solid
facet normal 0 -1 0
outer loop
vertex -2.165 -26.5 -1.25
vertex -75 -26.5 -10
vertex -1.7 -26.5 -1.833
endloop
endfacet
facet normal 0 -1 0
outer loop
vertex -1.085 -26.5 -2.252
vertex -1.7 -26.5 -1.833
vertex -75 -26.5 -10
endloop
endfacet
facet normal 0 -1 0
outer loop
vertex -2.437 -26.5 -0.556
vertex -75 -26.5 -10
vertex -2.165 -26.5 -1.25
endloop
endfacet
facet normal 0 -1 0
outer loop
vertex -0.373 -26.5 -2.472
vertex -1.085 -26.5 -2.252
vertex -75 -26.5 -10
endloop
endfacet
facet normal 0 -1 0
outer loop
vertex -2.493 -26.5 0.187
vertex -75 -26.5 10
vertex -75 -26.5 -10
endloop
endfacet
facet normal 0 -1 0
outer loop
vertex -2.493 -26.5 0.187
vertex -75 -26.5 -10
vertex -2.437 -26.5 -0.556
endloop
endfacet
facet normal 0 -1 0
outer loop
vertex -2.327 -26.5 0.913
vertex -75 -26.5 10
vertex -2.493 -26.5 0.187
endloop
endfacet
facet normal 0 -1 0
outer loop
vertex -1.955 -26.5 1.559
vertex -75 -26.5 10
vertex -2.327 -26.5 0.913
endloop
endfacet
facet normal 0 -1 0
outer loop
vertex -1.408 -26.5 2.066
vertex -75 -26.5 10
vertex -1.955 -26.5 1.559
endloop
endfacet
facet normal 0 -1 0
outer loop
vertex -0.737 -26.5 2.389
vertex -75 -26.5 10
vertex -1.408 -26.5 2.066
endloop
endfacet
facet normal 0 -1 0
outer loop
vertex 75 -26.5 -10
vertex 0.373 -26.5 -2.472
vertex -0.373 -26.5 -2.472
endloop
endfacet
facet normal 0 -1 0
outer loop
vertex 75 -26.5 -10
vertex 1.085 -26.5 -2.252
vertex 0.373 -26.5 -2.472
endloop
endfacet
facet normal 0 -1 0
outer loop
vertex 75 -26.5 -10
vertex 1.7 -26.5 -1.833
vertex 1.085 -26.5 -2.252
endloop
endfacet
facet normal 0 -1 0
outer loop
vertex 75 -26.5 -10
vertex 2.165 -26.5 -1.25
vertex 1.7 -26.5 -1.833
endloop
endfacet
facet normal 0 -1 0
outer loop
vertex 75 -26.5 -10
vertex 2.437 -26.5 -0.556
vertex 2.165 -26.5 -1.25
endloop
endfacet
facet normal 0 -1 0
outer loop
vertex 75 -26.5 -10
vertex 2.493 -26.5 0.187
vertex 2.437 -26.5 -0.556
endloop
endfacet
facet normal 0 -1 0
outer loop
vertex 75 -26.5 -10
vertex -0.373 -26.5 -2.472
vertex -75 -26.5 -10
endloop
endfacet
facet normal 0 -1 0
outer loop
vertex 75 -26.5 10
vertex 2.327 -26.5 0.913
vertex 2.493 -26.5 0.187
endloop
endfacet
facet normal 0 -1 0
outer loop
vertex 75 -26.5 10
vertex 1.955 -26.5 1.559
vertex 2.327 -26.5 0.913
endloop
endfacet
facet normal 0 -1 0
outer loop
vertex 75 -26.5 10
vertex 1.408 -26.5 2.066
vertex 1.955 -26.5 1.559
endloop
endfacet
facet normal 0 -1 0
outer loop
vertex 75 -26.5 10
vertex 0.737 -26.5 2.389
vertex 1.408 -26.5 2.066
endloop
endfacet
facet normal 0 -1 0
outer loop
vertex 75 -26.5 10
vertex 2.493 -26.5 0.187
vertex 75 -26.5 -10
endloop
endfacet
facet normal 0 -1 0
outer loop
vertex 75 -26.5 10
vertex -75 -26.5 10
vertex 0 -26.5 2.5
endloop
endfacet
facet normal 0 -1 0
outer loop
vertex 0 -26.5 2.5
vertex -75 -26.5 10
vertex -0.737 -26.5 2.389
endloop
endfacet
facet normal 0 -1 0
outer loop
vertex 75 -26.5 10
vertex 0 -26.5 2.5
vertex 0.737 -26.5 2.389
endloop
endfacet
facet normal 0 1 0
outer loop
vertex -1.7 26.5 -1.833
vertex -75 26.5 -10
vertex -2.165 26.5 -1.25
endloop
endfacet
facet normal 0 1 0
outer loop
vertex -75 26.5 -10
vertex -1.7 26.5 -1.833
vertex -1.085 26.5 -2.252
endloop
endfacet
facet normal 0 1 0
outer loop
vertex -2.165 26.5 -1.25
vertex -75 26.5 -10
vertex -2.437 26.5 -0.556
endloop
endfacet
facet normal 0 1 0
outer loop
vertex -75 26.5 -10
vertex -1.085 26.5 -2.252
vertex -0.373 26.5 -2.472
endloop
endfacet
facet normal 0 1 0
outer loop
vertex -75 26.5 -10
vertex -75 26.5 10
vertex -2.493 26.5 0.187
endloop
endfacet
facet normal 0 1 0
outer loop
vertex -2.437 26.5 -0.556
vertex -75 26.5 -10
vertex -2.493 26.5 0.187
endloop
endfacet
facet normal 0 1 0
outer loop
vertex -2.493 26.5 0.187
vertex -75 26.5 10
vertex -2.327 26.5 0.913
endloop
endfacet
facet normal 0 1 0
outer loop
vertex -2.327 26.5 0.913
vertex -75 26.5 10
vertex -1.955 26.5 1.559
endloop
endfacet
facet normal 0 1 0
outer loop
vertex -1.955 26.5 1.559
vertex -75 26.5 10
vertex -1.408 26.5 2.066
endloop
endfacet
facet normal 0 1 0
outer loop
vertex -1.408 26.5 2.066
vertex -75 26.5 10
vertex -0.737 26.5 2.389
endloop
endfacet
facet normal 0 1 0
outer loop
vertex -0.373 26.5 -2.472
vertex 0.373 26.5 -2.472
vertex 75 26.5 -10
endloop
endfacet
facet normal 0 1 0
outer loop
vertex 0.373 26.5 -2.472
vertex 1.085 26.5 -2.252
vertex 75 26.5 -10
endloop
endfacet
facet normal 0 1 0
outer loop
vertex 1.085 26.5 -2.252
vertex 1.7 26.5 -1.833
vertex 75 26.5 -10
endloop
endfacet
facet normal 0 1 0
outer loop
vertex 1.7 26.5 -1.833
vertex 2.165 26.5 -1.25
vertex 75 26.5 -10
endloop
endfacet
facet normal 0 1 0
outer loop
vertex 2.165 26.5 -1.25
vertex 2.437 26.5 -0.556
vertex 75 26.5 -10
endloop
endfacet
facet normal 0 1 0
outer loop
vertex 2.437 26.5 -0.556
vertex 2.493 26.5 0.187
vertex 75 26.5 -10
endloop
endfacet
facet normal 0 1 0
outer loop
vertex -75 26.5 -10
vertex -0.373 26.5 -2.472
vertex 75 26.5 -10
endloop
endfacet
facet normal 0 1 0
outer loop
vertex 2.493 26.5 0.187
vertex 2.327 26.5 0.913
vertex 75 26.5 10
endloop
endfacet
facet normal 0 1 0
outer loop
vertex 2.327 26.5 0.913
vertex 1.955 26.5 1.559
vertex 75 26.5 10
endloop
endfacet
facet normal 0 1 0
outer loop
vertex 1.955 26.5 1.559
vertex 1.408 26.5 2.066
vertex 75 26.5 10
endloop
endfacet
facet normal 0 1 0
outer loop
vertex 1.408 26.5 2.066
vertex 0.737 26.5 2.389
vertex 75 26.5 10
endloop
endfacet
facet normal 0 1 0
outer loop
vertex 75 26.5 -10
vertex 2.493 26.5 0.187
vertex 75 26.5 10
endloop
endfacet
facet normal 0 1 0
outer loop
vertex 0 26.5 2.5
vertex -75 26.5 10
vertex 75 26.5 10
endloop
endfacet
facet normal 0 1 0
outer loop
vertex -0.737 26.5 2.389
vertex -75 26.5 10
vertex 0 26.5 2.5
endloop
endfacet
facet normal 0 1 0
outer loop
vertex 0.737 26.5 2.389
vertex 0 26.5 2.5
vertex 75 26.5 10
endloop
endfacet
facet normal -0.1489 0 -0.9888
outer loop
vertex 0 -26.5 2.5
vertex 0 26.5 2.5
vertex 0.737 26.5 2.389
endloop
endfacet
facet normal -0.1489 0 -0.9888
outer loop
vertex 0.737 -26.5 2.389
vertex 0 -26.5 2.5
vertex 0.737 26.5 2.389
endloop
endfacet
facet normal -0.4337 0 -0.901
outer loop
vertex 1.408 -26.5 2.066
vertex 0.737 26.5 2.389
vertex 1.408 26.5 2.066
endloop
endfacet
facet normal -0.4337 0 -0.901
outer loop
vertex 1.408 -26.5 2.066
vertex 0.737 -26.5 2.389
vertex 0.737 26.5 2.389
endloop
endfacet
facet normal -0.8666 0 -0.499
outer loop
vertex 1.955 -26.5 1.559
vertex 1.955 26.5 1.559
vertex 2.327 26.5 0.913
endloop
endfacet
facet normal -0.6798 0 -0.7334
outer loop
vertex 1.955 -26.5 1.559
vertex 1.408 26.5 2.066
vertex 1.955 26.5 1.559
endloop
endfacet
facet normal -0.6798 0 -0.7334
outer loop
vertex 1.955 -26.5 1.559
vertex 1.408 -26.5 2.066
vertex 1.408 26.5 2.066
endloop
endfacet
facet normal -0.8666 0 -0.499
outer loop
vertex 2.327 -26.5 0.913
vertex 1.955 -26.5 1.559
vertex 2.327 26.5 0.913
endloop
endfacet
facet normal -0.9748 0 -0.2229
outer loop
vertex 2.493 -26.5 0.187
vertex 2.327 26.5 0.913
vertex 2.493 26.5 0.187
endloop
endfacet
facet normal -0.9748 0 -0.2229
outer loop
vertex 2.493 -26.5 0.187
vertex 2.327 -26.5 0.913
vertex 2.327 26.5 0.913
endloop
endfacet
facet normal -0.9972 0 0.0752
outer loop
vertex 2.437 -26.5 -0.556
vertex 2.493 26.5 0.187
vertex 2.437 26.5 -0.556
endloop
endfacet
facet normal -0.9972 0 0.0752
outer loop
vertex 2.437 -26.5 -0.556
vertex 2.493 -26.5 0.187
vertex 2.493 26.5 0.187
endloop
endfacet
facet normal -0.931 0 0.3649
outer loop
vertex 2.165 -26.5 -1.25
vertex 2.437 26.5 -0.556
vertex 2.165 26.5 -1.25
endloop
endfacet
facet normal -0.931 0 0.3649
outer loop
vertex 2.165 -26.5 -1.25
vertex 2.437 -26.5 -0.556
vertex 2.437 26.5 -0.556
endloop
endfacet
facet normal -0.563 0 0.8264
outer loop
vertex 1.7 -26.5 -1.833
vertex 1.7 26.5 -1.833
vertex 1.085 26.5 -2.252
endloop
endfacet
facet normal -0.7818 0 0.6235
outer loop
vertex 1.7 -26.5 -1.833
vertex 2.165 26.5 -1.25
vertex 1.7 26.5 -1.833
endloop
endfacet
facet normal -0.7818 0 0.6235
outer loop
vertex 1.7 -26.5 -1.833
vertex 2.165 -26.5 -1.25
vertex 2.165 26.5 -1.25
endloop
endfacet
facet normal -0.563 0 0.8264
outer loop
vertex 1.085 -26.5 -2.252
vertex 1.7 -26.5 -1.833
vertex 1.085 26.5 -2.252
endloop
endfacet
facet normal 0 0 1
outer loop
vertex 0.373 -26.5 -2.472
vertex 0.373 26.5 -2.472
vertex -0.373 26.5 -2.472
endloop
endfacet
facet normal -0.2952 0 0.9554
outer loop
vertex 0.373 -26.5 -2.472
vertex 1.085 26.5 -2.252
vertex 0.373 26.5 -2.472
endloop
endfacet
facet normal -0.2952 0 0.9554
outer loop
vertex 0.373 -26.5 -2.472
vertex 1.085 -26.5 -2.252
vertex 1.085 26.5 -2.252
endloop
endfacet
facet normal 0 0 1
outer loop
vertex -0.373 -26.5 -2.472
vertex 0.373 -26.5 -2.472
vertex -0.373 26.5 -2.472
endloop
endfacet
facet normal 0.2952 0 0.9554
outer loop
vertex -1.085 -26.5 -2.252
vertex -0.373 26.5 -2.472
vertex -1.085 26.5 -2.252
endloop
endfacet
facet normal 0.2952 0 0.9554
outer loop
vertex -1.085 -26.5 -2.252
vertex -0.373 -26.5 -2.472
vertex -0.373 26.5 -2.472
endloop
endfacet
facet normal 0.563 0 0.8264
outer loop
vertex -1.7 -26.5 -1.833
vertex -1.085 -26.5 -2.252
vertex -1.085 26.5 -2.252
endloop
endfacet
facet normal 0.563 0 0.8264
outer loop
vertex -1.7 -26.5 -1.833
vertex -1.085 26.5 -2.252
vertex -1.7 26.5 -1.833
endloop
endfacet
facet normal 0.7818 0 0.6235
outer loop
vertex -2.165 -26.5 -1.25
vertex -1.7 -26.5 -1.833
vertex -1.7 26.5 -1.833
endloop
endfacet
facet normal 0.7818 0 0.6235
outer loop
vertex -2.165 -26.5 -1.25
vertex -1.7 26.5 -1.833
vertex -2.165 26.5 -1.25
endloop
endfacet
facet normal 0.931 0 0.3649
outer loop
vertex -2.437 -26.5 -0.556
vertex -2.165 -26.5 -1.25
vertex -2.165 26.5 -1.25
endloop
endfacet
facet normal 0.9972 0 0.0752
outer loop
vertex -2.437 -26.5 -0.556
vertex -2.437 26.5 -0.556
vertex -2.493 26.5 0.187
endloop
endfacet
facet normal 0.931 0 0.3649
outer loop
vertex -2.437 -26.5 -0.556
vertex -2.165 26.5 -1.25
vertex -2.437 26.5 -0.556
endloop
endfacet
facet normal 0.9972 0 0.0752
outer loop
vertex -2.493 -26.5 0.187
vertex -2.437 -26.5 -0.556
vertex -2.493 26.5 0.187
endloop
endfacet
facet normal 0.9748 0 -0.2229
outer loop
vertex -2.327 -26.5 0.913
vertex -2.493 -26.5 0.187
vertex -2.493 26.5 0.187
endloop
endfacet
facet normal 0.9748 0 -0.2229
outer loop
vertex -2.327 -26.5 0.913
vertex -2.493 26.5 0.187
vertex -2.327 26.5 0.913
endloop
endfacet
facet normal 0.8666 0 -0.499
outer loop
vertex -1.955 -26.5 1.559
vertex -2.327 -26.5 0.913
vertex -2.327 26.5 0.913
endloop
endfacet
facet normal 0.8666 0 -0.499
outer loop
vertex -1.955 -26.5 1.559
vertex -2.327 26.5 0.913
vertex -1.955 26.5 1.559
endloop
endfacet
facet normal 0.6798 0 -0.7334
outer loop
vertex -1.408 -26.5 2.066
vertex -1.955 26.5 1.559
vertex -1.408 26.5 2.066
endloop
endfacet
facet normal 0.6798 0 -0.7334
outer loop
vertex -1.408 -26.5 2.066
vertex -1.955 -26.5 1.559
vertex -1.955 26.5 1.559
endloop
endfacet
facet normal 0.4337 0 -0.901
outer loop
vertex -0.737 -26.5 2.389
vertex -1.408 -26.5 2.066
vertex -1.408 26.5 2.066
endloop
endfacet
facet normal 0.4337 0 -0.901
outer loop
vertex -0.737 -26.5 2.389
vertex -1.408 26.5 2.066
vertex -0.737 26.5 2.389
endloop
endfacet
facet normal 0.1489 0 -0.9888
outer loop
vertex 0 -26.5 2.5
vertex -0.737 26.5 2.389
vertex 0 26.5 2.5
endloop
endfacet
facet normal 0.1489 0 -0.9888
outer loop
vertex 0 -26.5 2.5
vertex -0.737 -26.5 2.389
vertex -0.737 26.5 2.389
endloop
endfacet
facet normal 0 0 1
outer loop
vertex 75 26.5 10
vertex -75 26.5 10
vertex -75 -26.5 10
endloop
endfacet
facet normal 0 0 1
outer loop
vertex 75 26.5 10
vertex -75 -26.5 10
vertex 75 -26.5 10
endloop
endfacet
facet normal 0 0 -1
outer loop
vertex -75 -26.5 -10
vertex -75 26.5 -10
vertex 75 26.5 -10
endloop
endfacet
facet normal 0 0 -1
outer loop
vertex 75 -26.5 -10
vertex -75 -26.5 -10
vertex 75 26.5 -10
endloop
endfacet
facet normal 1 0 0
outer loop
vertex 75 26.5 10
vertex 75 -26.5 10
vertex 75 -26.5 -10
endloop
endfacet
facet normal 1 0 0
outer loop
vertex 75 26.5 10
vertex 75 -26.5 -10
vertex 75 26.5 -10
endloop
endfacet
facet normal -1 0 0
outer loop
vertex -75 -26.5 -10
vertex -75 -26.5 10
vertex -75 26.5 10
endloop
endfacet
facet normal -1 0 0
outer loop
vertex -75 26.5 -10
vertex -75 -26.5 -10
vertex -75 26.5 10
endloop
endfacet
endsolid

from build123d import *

# Parameters (mm, degrees)
SKETCH_1_W               = 150
SKETCH_1_H               = 53
EXTRUDE_1_DEPTH          = 10
CUT_EXTRUDE_1_DEPTH      = 81.170131595
CUT_EXTRUDE_1_DEPTH_BACK = 81.170131595
SKETCH_2_R               = 2.5


with BuildPart() as part:
    # Эскиз1 → Бобышка-Вытянуть1 (new, symmetric)
    with BuildSketch(Plane.XY):
        Rectangle(SKETCH_1_W, SKETCH_1_H)
    extrude(amount=EXTRUDE_1_DEPTH, both=True)

    # Эскиз2 → Вырез-Вытянуть1 (cut, two sides: drawn at the far end of the back side and taken through both)
    with BuildSketch(Plane(origin=(0, 0, 0), x_dir=(1, 0, 0), z_dir=(0, 1, 0)).offset(-CUT_EXTRUDE_1_DEPTH_BACK)):
        with Locations(Location((0, 0, 0), (0, 0, 270))):
            Circle(SKETCH_2_R)
    extrude(amount=CUT_EXTRUDE_1_DEPTH + CUT_EXTRUDE_1_DEPTH_BACK, mode=Mode.SUBTRACT)


solid = part.part
